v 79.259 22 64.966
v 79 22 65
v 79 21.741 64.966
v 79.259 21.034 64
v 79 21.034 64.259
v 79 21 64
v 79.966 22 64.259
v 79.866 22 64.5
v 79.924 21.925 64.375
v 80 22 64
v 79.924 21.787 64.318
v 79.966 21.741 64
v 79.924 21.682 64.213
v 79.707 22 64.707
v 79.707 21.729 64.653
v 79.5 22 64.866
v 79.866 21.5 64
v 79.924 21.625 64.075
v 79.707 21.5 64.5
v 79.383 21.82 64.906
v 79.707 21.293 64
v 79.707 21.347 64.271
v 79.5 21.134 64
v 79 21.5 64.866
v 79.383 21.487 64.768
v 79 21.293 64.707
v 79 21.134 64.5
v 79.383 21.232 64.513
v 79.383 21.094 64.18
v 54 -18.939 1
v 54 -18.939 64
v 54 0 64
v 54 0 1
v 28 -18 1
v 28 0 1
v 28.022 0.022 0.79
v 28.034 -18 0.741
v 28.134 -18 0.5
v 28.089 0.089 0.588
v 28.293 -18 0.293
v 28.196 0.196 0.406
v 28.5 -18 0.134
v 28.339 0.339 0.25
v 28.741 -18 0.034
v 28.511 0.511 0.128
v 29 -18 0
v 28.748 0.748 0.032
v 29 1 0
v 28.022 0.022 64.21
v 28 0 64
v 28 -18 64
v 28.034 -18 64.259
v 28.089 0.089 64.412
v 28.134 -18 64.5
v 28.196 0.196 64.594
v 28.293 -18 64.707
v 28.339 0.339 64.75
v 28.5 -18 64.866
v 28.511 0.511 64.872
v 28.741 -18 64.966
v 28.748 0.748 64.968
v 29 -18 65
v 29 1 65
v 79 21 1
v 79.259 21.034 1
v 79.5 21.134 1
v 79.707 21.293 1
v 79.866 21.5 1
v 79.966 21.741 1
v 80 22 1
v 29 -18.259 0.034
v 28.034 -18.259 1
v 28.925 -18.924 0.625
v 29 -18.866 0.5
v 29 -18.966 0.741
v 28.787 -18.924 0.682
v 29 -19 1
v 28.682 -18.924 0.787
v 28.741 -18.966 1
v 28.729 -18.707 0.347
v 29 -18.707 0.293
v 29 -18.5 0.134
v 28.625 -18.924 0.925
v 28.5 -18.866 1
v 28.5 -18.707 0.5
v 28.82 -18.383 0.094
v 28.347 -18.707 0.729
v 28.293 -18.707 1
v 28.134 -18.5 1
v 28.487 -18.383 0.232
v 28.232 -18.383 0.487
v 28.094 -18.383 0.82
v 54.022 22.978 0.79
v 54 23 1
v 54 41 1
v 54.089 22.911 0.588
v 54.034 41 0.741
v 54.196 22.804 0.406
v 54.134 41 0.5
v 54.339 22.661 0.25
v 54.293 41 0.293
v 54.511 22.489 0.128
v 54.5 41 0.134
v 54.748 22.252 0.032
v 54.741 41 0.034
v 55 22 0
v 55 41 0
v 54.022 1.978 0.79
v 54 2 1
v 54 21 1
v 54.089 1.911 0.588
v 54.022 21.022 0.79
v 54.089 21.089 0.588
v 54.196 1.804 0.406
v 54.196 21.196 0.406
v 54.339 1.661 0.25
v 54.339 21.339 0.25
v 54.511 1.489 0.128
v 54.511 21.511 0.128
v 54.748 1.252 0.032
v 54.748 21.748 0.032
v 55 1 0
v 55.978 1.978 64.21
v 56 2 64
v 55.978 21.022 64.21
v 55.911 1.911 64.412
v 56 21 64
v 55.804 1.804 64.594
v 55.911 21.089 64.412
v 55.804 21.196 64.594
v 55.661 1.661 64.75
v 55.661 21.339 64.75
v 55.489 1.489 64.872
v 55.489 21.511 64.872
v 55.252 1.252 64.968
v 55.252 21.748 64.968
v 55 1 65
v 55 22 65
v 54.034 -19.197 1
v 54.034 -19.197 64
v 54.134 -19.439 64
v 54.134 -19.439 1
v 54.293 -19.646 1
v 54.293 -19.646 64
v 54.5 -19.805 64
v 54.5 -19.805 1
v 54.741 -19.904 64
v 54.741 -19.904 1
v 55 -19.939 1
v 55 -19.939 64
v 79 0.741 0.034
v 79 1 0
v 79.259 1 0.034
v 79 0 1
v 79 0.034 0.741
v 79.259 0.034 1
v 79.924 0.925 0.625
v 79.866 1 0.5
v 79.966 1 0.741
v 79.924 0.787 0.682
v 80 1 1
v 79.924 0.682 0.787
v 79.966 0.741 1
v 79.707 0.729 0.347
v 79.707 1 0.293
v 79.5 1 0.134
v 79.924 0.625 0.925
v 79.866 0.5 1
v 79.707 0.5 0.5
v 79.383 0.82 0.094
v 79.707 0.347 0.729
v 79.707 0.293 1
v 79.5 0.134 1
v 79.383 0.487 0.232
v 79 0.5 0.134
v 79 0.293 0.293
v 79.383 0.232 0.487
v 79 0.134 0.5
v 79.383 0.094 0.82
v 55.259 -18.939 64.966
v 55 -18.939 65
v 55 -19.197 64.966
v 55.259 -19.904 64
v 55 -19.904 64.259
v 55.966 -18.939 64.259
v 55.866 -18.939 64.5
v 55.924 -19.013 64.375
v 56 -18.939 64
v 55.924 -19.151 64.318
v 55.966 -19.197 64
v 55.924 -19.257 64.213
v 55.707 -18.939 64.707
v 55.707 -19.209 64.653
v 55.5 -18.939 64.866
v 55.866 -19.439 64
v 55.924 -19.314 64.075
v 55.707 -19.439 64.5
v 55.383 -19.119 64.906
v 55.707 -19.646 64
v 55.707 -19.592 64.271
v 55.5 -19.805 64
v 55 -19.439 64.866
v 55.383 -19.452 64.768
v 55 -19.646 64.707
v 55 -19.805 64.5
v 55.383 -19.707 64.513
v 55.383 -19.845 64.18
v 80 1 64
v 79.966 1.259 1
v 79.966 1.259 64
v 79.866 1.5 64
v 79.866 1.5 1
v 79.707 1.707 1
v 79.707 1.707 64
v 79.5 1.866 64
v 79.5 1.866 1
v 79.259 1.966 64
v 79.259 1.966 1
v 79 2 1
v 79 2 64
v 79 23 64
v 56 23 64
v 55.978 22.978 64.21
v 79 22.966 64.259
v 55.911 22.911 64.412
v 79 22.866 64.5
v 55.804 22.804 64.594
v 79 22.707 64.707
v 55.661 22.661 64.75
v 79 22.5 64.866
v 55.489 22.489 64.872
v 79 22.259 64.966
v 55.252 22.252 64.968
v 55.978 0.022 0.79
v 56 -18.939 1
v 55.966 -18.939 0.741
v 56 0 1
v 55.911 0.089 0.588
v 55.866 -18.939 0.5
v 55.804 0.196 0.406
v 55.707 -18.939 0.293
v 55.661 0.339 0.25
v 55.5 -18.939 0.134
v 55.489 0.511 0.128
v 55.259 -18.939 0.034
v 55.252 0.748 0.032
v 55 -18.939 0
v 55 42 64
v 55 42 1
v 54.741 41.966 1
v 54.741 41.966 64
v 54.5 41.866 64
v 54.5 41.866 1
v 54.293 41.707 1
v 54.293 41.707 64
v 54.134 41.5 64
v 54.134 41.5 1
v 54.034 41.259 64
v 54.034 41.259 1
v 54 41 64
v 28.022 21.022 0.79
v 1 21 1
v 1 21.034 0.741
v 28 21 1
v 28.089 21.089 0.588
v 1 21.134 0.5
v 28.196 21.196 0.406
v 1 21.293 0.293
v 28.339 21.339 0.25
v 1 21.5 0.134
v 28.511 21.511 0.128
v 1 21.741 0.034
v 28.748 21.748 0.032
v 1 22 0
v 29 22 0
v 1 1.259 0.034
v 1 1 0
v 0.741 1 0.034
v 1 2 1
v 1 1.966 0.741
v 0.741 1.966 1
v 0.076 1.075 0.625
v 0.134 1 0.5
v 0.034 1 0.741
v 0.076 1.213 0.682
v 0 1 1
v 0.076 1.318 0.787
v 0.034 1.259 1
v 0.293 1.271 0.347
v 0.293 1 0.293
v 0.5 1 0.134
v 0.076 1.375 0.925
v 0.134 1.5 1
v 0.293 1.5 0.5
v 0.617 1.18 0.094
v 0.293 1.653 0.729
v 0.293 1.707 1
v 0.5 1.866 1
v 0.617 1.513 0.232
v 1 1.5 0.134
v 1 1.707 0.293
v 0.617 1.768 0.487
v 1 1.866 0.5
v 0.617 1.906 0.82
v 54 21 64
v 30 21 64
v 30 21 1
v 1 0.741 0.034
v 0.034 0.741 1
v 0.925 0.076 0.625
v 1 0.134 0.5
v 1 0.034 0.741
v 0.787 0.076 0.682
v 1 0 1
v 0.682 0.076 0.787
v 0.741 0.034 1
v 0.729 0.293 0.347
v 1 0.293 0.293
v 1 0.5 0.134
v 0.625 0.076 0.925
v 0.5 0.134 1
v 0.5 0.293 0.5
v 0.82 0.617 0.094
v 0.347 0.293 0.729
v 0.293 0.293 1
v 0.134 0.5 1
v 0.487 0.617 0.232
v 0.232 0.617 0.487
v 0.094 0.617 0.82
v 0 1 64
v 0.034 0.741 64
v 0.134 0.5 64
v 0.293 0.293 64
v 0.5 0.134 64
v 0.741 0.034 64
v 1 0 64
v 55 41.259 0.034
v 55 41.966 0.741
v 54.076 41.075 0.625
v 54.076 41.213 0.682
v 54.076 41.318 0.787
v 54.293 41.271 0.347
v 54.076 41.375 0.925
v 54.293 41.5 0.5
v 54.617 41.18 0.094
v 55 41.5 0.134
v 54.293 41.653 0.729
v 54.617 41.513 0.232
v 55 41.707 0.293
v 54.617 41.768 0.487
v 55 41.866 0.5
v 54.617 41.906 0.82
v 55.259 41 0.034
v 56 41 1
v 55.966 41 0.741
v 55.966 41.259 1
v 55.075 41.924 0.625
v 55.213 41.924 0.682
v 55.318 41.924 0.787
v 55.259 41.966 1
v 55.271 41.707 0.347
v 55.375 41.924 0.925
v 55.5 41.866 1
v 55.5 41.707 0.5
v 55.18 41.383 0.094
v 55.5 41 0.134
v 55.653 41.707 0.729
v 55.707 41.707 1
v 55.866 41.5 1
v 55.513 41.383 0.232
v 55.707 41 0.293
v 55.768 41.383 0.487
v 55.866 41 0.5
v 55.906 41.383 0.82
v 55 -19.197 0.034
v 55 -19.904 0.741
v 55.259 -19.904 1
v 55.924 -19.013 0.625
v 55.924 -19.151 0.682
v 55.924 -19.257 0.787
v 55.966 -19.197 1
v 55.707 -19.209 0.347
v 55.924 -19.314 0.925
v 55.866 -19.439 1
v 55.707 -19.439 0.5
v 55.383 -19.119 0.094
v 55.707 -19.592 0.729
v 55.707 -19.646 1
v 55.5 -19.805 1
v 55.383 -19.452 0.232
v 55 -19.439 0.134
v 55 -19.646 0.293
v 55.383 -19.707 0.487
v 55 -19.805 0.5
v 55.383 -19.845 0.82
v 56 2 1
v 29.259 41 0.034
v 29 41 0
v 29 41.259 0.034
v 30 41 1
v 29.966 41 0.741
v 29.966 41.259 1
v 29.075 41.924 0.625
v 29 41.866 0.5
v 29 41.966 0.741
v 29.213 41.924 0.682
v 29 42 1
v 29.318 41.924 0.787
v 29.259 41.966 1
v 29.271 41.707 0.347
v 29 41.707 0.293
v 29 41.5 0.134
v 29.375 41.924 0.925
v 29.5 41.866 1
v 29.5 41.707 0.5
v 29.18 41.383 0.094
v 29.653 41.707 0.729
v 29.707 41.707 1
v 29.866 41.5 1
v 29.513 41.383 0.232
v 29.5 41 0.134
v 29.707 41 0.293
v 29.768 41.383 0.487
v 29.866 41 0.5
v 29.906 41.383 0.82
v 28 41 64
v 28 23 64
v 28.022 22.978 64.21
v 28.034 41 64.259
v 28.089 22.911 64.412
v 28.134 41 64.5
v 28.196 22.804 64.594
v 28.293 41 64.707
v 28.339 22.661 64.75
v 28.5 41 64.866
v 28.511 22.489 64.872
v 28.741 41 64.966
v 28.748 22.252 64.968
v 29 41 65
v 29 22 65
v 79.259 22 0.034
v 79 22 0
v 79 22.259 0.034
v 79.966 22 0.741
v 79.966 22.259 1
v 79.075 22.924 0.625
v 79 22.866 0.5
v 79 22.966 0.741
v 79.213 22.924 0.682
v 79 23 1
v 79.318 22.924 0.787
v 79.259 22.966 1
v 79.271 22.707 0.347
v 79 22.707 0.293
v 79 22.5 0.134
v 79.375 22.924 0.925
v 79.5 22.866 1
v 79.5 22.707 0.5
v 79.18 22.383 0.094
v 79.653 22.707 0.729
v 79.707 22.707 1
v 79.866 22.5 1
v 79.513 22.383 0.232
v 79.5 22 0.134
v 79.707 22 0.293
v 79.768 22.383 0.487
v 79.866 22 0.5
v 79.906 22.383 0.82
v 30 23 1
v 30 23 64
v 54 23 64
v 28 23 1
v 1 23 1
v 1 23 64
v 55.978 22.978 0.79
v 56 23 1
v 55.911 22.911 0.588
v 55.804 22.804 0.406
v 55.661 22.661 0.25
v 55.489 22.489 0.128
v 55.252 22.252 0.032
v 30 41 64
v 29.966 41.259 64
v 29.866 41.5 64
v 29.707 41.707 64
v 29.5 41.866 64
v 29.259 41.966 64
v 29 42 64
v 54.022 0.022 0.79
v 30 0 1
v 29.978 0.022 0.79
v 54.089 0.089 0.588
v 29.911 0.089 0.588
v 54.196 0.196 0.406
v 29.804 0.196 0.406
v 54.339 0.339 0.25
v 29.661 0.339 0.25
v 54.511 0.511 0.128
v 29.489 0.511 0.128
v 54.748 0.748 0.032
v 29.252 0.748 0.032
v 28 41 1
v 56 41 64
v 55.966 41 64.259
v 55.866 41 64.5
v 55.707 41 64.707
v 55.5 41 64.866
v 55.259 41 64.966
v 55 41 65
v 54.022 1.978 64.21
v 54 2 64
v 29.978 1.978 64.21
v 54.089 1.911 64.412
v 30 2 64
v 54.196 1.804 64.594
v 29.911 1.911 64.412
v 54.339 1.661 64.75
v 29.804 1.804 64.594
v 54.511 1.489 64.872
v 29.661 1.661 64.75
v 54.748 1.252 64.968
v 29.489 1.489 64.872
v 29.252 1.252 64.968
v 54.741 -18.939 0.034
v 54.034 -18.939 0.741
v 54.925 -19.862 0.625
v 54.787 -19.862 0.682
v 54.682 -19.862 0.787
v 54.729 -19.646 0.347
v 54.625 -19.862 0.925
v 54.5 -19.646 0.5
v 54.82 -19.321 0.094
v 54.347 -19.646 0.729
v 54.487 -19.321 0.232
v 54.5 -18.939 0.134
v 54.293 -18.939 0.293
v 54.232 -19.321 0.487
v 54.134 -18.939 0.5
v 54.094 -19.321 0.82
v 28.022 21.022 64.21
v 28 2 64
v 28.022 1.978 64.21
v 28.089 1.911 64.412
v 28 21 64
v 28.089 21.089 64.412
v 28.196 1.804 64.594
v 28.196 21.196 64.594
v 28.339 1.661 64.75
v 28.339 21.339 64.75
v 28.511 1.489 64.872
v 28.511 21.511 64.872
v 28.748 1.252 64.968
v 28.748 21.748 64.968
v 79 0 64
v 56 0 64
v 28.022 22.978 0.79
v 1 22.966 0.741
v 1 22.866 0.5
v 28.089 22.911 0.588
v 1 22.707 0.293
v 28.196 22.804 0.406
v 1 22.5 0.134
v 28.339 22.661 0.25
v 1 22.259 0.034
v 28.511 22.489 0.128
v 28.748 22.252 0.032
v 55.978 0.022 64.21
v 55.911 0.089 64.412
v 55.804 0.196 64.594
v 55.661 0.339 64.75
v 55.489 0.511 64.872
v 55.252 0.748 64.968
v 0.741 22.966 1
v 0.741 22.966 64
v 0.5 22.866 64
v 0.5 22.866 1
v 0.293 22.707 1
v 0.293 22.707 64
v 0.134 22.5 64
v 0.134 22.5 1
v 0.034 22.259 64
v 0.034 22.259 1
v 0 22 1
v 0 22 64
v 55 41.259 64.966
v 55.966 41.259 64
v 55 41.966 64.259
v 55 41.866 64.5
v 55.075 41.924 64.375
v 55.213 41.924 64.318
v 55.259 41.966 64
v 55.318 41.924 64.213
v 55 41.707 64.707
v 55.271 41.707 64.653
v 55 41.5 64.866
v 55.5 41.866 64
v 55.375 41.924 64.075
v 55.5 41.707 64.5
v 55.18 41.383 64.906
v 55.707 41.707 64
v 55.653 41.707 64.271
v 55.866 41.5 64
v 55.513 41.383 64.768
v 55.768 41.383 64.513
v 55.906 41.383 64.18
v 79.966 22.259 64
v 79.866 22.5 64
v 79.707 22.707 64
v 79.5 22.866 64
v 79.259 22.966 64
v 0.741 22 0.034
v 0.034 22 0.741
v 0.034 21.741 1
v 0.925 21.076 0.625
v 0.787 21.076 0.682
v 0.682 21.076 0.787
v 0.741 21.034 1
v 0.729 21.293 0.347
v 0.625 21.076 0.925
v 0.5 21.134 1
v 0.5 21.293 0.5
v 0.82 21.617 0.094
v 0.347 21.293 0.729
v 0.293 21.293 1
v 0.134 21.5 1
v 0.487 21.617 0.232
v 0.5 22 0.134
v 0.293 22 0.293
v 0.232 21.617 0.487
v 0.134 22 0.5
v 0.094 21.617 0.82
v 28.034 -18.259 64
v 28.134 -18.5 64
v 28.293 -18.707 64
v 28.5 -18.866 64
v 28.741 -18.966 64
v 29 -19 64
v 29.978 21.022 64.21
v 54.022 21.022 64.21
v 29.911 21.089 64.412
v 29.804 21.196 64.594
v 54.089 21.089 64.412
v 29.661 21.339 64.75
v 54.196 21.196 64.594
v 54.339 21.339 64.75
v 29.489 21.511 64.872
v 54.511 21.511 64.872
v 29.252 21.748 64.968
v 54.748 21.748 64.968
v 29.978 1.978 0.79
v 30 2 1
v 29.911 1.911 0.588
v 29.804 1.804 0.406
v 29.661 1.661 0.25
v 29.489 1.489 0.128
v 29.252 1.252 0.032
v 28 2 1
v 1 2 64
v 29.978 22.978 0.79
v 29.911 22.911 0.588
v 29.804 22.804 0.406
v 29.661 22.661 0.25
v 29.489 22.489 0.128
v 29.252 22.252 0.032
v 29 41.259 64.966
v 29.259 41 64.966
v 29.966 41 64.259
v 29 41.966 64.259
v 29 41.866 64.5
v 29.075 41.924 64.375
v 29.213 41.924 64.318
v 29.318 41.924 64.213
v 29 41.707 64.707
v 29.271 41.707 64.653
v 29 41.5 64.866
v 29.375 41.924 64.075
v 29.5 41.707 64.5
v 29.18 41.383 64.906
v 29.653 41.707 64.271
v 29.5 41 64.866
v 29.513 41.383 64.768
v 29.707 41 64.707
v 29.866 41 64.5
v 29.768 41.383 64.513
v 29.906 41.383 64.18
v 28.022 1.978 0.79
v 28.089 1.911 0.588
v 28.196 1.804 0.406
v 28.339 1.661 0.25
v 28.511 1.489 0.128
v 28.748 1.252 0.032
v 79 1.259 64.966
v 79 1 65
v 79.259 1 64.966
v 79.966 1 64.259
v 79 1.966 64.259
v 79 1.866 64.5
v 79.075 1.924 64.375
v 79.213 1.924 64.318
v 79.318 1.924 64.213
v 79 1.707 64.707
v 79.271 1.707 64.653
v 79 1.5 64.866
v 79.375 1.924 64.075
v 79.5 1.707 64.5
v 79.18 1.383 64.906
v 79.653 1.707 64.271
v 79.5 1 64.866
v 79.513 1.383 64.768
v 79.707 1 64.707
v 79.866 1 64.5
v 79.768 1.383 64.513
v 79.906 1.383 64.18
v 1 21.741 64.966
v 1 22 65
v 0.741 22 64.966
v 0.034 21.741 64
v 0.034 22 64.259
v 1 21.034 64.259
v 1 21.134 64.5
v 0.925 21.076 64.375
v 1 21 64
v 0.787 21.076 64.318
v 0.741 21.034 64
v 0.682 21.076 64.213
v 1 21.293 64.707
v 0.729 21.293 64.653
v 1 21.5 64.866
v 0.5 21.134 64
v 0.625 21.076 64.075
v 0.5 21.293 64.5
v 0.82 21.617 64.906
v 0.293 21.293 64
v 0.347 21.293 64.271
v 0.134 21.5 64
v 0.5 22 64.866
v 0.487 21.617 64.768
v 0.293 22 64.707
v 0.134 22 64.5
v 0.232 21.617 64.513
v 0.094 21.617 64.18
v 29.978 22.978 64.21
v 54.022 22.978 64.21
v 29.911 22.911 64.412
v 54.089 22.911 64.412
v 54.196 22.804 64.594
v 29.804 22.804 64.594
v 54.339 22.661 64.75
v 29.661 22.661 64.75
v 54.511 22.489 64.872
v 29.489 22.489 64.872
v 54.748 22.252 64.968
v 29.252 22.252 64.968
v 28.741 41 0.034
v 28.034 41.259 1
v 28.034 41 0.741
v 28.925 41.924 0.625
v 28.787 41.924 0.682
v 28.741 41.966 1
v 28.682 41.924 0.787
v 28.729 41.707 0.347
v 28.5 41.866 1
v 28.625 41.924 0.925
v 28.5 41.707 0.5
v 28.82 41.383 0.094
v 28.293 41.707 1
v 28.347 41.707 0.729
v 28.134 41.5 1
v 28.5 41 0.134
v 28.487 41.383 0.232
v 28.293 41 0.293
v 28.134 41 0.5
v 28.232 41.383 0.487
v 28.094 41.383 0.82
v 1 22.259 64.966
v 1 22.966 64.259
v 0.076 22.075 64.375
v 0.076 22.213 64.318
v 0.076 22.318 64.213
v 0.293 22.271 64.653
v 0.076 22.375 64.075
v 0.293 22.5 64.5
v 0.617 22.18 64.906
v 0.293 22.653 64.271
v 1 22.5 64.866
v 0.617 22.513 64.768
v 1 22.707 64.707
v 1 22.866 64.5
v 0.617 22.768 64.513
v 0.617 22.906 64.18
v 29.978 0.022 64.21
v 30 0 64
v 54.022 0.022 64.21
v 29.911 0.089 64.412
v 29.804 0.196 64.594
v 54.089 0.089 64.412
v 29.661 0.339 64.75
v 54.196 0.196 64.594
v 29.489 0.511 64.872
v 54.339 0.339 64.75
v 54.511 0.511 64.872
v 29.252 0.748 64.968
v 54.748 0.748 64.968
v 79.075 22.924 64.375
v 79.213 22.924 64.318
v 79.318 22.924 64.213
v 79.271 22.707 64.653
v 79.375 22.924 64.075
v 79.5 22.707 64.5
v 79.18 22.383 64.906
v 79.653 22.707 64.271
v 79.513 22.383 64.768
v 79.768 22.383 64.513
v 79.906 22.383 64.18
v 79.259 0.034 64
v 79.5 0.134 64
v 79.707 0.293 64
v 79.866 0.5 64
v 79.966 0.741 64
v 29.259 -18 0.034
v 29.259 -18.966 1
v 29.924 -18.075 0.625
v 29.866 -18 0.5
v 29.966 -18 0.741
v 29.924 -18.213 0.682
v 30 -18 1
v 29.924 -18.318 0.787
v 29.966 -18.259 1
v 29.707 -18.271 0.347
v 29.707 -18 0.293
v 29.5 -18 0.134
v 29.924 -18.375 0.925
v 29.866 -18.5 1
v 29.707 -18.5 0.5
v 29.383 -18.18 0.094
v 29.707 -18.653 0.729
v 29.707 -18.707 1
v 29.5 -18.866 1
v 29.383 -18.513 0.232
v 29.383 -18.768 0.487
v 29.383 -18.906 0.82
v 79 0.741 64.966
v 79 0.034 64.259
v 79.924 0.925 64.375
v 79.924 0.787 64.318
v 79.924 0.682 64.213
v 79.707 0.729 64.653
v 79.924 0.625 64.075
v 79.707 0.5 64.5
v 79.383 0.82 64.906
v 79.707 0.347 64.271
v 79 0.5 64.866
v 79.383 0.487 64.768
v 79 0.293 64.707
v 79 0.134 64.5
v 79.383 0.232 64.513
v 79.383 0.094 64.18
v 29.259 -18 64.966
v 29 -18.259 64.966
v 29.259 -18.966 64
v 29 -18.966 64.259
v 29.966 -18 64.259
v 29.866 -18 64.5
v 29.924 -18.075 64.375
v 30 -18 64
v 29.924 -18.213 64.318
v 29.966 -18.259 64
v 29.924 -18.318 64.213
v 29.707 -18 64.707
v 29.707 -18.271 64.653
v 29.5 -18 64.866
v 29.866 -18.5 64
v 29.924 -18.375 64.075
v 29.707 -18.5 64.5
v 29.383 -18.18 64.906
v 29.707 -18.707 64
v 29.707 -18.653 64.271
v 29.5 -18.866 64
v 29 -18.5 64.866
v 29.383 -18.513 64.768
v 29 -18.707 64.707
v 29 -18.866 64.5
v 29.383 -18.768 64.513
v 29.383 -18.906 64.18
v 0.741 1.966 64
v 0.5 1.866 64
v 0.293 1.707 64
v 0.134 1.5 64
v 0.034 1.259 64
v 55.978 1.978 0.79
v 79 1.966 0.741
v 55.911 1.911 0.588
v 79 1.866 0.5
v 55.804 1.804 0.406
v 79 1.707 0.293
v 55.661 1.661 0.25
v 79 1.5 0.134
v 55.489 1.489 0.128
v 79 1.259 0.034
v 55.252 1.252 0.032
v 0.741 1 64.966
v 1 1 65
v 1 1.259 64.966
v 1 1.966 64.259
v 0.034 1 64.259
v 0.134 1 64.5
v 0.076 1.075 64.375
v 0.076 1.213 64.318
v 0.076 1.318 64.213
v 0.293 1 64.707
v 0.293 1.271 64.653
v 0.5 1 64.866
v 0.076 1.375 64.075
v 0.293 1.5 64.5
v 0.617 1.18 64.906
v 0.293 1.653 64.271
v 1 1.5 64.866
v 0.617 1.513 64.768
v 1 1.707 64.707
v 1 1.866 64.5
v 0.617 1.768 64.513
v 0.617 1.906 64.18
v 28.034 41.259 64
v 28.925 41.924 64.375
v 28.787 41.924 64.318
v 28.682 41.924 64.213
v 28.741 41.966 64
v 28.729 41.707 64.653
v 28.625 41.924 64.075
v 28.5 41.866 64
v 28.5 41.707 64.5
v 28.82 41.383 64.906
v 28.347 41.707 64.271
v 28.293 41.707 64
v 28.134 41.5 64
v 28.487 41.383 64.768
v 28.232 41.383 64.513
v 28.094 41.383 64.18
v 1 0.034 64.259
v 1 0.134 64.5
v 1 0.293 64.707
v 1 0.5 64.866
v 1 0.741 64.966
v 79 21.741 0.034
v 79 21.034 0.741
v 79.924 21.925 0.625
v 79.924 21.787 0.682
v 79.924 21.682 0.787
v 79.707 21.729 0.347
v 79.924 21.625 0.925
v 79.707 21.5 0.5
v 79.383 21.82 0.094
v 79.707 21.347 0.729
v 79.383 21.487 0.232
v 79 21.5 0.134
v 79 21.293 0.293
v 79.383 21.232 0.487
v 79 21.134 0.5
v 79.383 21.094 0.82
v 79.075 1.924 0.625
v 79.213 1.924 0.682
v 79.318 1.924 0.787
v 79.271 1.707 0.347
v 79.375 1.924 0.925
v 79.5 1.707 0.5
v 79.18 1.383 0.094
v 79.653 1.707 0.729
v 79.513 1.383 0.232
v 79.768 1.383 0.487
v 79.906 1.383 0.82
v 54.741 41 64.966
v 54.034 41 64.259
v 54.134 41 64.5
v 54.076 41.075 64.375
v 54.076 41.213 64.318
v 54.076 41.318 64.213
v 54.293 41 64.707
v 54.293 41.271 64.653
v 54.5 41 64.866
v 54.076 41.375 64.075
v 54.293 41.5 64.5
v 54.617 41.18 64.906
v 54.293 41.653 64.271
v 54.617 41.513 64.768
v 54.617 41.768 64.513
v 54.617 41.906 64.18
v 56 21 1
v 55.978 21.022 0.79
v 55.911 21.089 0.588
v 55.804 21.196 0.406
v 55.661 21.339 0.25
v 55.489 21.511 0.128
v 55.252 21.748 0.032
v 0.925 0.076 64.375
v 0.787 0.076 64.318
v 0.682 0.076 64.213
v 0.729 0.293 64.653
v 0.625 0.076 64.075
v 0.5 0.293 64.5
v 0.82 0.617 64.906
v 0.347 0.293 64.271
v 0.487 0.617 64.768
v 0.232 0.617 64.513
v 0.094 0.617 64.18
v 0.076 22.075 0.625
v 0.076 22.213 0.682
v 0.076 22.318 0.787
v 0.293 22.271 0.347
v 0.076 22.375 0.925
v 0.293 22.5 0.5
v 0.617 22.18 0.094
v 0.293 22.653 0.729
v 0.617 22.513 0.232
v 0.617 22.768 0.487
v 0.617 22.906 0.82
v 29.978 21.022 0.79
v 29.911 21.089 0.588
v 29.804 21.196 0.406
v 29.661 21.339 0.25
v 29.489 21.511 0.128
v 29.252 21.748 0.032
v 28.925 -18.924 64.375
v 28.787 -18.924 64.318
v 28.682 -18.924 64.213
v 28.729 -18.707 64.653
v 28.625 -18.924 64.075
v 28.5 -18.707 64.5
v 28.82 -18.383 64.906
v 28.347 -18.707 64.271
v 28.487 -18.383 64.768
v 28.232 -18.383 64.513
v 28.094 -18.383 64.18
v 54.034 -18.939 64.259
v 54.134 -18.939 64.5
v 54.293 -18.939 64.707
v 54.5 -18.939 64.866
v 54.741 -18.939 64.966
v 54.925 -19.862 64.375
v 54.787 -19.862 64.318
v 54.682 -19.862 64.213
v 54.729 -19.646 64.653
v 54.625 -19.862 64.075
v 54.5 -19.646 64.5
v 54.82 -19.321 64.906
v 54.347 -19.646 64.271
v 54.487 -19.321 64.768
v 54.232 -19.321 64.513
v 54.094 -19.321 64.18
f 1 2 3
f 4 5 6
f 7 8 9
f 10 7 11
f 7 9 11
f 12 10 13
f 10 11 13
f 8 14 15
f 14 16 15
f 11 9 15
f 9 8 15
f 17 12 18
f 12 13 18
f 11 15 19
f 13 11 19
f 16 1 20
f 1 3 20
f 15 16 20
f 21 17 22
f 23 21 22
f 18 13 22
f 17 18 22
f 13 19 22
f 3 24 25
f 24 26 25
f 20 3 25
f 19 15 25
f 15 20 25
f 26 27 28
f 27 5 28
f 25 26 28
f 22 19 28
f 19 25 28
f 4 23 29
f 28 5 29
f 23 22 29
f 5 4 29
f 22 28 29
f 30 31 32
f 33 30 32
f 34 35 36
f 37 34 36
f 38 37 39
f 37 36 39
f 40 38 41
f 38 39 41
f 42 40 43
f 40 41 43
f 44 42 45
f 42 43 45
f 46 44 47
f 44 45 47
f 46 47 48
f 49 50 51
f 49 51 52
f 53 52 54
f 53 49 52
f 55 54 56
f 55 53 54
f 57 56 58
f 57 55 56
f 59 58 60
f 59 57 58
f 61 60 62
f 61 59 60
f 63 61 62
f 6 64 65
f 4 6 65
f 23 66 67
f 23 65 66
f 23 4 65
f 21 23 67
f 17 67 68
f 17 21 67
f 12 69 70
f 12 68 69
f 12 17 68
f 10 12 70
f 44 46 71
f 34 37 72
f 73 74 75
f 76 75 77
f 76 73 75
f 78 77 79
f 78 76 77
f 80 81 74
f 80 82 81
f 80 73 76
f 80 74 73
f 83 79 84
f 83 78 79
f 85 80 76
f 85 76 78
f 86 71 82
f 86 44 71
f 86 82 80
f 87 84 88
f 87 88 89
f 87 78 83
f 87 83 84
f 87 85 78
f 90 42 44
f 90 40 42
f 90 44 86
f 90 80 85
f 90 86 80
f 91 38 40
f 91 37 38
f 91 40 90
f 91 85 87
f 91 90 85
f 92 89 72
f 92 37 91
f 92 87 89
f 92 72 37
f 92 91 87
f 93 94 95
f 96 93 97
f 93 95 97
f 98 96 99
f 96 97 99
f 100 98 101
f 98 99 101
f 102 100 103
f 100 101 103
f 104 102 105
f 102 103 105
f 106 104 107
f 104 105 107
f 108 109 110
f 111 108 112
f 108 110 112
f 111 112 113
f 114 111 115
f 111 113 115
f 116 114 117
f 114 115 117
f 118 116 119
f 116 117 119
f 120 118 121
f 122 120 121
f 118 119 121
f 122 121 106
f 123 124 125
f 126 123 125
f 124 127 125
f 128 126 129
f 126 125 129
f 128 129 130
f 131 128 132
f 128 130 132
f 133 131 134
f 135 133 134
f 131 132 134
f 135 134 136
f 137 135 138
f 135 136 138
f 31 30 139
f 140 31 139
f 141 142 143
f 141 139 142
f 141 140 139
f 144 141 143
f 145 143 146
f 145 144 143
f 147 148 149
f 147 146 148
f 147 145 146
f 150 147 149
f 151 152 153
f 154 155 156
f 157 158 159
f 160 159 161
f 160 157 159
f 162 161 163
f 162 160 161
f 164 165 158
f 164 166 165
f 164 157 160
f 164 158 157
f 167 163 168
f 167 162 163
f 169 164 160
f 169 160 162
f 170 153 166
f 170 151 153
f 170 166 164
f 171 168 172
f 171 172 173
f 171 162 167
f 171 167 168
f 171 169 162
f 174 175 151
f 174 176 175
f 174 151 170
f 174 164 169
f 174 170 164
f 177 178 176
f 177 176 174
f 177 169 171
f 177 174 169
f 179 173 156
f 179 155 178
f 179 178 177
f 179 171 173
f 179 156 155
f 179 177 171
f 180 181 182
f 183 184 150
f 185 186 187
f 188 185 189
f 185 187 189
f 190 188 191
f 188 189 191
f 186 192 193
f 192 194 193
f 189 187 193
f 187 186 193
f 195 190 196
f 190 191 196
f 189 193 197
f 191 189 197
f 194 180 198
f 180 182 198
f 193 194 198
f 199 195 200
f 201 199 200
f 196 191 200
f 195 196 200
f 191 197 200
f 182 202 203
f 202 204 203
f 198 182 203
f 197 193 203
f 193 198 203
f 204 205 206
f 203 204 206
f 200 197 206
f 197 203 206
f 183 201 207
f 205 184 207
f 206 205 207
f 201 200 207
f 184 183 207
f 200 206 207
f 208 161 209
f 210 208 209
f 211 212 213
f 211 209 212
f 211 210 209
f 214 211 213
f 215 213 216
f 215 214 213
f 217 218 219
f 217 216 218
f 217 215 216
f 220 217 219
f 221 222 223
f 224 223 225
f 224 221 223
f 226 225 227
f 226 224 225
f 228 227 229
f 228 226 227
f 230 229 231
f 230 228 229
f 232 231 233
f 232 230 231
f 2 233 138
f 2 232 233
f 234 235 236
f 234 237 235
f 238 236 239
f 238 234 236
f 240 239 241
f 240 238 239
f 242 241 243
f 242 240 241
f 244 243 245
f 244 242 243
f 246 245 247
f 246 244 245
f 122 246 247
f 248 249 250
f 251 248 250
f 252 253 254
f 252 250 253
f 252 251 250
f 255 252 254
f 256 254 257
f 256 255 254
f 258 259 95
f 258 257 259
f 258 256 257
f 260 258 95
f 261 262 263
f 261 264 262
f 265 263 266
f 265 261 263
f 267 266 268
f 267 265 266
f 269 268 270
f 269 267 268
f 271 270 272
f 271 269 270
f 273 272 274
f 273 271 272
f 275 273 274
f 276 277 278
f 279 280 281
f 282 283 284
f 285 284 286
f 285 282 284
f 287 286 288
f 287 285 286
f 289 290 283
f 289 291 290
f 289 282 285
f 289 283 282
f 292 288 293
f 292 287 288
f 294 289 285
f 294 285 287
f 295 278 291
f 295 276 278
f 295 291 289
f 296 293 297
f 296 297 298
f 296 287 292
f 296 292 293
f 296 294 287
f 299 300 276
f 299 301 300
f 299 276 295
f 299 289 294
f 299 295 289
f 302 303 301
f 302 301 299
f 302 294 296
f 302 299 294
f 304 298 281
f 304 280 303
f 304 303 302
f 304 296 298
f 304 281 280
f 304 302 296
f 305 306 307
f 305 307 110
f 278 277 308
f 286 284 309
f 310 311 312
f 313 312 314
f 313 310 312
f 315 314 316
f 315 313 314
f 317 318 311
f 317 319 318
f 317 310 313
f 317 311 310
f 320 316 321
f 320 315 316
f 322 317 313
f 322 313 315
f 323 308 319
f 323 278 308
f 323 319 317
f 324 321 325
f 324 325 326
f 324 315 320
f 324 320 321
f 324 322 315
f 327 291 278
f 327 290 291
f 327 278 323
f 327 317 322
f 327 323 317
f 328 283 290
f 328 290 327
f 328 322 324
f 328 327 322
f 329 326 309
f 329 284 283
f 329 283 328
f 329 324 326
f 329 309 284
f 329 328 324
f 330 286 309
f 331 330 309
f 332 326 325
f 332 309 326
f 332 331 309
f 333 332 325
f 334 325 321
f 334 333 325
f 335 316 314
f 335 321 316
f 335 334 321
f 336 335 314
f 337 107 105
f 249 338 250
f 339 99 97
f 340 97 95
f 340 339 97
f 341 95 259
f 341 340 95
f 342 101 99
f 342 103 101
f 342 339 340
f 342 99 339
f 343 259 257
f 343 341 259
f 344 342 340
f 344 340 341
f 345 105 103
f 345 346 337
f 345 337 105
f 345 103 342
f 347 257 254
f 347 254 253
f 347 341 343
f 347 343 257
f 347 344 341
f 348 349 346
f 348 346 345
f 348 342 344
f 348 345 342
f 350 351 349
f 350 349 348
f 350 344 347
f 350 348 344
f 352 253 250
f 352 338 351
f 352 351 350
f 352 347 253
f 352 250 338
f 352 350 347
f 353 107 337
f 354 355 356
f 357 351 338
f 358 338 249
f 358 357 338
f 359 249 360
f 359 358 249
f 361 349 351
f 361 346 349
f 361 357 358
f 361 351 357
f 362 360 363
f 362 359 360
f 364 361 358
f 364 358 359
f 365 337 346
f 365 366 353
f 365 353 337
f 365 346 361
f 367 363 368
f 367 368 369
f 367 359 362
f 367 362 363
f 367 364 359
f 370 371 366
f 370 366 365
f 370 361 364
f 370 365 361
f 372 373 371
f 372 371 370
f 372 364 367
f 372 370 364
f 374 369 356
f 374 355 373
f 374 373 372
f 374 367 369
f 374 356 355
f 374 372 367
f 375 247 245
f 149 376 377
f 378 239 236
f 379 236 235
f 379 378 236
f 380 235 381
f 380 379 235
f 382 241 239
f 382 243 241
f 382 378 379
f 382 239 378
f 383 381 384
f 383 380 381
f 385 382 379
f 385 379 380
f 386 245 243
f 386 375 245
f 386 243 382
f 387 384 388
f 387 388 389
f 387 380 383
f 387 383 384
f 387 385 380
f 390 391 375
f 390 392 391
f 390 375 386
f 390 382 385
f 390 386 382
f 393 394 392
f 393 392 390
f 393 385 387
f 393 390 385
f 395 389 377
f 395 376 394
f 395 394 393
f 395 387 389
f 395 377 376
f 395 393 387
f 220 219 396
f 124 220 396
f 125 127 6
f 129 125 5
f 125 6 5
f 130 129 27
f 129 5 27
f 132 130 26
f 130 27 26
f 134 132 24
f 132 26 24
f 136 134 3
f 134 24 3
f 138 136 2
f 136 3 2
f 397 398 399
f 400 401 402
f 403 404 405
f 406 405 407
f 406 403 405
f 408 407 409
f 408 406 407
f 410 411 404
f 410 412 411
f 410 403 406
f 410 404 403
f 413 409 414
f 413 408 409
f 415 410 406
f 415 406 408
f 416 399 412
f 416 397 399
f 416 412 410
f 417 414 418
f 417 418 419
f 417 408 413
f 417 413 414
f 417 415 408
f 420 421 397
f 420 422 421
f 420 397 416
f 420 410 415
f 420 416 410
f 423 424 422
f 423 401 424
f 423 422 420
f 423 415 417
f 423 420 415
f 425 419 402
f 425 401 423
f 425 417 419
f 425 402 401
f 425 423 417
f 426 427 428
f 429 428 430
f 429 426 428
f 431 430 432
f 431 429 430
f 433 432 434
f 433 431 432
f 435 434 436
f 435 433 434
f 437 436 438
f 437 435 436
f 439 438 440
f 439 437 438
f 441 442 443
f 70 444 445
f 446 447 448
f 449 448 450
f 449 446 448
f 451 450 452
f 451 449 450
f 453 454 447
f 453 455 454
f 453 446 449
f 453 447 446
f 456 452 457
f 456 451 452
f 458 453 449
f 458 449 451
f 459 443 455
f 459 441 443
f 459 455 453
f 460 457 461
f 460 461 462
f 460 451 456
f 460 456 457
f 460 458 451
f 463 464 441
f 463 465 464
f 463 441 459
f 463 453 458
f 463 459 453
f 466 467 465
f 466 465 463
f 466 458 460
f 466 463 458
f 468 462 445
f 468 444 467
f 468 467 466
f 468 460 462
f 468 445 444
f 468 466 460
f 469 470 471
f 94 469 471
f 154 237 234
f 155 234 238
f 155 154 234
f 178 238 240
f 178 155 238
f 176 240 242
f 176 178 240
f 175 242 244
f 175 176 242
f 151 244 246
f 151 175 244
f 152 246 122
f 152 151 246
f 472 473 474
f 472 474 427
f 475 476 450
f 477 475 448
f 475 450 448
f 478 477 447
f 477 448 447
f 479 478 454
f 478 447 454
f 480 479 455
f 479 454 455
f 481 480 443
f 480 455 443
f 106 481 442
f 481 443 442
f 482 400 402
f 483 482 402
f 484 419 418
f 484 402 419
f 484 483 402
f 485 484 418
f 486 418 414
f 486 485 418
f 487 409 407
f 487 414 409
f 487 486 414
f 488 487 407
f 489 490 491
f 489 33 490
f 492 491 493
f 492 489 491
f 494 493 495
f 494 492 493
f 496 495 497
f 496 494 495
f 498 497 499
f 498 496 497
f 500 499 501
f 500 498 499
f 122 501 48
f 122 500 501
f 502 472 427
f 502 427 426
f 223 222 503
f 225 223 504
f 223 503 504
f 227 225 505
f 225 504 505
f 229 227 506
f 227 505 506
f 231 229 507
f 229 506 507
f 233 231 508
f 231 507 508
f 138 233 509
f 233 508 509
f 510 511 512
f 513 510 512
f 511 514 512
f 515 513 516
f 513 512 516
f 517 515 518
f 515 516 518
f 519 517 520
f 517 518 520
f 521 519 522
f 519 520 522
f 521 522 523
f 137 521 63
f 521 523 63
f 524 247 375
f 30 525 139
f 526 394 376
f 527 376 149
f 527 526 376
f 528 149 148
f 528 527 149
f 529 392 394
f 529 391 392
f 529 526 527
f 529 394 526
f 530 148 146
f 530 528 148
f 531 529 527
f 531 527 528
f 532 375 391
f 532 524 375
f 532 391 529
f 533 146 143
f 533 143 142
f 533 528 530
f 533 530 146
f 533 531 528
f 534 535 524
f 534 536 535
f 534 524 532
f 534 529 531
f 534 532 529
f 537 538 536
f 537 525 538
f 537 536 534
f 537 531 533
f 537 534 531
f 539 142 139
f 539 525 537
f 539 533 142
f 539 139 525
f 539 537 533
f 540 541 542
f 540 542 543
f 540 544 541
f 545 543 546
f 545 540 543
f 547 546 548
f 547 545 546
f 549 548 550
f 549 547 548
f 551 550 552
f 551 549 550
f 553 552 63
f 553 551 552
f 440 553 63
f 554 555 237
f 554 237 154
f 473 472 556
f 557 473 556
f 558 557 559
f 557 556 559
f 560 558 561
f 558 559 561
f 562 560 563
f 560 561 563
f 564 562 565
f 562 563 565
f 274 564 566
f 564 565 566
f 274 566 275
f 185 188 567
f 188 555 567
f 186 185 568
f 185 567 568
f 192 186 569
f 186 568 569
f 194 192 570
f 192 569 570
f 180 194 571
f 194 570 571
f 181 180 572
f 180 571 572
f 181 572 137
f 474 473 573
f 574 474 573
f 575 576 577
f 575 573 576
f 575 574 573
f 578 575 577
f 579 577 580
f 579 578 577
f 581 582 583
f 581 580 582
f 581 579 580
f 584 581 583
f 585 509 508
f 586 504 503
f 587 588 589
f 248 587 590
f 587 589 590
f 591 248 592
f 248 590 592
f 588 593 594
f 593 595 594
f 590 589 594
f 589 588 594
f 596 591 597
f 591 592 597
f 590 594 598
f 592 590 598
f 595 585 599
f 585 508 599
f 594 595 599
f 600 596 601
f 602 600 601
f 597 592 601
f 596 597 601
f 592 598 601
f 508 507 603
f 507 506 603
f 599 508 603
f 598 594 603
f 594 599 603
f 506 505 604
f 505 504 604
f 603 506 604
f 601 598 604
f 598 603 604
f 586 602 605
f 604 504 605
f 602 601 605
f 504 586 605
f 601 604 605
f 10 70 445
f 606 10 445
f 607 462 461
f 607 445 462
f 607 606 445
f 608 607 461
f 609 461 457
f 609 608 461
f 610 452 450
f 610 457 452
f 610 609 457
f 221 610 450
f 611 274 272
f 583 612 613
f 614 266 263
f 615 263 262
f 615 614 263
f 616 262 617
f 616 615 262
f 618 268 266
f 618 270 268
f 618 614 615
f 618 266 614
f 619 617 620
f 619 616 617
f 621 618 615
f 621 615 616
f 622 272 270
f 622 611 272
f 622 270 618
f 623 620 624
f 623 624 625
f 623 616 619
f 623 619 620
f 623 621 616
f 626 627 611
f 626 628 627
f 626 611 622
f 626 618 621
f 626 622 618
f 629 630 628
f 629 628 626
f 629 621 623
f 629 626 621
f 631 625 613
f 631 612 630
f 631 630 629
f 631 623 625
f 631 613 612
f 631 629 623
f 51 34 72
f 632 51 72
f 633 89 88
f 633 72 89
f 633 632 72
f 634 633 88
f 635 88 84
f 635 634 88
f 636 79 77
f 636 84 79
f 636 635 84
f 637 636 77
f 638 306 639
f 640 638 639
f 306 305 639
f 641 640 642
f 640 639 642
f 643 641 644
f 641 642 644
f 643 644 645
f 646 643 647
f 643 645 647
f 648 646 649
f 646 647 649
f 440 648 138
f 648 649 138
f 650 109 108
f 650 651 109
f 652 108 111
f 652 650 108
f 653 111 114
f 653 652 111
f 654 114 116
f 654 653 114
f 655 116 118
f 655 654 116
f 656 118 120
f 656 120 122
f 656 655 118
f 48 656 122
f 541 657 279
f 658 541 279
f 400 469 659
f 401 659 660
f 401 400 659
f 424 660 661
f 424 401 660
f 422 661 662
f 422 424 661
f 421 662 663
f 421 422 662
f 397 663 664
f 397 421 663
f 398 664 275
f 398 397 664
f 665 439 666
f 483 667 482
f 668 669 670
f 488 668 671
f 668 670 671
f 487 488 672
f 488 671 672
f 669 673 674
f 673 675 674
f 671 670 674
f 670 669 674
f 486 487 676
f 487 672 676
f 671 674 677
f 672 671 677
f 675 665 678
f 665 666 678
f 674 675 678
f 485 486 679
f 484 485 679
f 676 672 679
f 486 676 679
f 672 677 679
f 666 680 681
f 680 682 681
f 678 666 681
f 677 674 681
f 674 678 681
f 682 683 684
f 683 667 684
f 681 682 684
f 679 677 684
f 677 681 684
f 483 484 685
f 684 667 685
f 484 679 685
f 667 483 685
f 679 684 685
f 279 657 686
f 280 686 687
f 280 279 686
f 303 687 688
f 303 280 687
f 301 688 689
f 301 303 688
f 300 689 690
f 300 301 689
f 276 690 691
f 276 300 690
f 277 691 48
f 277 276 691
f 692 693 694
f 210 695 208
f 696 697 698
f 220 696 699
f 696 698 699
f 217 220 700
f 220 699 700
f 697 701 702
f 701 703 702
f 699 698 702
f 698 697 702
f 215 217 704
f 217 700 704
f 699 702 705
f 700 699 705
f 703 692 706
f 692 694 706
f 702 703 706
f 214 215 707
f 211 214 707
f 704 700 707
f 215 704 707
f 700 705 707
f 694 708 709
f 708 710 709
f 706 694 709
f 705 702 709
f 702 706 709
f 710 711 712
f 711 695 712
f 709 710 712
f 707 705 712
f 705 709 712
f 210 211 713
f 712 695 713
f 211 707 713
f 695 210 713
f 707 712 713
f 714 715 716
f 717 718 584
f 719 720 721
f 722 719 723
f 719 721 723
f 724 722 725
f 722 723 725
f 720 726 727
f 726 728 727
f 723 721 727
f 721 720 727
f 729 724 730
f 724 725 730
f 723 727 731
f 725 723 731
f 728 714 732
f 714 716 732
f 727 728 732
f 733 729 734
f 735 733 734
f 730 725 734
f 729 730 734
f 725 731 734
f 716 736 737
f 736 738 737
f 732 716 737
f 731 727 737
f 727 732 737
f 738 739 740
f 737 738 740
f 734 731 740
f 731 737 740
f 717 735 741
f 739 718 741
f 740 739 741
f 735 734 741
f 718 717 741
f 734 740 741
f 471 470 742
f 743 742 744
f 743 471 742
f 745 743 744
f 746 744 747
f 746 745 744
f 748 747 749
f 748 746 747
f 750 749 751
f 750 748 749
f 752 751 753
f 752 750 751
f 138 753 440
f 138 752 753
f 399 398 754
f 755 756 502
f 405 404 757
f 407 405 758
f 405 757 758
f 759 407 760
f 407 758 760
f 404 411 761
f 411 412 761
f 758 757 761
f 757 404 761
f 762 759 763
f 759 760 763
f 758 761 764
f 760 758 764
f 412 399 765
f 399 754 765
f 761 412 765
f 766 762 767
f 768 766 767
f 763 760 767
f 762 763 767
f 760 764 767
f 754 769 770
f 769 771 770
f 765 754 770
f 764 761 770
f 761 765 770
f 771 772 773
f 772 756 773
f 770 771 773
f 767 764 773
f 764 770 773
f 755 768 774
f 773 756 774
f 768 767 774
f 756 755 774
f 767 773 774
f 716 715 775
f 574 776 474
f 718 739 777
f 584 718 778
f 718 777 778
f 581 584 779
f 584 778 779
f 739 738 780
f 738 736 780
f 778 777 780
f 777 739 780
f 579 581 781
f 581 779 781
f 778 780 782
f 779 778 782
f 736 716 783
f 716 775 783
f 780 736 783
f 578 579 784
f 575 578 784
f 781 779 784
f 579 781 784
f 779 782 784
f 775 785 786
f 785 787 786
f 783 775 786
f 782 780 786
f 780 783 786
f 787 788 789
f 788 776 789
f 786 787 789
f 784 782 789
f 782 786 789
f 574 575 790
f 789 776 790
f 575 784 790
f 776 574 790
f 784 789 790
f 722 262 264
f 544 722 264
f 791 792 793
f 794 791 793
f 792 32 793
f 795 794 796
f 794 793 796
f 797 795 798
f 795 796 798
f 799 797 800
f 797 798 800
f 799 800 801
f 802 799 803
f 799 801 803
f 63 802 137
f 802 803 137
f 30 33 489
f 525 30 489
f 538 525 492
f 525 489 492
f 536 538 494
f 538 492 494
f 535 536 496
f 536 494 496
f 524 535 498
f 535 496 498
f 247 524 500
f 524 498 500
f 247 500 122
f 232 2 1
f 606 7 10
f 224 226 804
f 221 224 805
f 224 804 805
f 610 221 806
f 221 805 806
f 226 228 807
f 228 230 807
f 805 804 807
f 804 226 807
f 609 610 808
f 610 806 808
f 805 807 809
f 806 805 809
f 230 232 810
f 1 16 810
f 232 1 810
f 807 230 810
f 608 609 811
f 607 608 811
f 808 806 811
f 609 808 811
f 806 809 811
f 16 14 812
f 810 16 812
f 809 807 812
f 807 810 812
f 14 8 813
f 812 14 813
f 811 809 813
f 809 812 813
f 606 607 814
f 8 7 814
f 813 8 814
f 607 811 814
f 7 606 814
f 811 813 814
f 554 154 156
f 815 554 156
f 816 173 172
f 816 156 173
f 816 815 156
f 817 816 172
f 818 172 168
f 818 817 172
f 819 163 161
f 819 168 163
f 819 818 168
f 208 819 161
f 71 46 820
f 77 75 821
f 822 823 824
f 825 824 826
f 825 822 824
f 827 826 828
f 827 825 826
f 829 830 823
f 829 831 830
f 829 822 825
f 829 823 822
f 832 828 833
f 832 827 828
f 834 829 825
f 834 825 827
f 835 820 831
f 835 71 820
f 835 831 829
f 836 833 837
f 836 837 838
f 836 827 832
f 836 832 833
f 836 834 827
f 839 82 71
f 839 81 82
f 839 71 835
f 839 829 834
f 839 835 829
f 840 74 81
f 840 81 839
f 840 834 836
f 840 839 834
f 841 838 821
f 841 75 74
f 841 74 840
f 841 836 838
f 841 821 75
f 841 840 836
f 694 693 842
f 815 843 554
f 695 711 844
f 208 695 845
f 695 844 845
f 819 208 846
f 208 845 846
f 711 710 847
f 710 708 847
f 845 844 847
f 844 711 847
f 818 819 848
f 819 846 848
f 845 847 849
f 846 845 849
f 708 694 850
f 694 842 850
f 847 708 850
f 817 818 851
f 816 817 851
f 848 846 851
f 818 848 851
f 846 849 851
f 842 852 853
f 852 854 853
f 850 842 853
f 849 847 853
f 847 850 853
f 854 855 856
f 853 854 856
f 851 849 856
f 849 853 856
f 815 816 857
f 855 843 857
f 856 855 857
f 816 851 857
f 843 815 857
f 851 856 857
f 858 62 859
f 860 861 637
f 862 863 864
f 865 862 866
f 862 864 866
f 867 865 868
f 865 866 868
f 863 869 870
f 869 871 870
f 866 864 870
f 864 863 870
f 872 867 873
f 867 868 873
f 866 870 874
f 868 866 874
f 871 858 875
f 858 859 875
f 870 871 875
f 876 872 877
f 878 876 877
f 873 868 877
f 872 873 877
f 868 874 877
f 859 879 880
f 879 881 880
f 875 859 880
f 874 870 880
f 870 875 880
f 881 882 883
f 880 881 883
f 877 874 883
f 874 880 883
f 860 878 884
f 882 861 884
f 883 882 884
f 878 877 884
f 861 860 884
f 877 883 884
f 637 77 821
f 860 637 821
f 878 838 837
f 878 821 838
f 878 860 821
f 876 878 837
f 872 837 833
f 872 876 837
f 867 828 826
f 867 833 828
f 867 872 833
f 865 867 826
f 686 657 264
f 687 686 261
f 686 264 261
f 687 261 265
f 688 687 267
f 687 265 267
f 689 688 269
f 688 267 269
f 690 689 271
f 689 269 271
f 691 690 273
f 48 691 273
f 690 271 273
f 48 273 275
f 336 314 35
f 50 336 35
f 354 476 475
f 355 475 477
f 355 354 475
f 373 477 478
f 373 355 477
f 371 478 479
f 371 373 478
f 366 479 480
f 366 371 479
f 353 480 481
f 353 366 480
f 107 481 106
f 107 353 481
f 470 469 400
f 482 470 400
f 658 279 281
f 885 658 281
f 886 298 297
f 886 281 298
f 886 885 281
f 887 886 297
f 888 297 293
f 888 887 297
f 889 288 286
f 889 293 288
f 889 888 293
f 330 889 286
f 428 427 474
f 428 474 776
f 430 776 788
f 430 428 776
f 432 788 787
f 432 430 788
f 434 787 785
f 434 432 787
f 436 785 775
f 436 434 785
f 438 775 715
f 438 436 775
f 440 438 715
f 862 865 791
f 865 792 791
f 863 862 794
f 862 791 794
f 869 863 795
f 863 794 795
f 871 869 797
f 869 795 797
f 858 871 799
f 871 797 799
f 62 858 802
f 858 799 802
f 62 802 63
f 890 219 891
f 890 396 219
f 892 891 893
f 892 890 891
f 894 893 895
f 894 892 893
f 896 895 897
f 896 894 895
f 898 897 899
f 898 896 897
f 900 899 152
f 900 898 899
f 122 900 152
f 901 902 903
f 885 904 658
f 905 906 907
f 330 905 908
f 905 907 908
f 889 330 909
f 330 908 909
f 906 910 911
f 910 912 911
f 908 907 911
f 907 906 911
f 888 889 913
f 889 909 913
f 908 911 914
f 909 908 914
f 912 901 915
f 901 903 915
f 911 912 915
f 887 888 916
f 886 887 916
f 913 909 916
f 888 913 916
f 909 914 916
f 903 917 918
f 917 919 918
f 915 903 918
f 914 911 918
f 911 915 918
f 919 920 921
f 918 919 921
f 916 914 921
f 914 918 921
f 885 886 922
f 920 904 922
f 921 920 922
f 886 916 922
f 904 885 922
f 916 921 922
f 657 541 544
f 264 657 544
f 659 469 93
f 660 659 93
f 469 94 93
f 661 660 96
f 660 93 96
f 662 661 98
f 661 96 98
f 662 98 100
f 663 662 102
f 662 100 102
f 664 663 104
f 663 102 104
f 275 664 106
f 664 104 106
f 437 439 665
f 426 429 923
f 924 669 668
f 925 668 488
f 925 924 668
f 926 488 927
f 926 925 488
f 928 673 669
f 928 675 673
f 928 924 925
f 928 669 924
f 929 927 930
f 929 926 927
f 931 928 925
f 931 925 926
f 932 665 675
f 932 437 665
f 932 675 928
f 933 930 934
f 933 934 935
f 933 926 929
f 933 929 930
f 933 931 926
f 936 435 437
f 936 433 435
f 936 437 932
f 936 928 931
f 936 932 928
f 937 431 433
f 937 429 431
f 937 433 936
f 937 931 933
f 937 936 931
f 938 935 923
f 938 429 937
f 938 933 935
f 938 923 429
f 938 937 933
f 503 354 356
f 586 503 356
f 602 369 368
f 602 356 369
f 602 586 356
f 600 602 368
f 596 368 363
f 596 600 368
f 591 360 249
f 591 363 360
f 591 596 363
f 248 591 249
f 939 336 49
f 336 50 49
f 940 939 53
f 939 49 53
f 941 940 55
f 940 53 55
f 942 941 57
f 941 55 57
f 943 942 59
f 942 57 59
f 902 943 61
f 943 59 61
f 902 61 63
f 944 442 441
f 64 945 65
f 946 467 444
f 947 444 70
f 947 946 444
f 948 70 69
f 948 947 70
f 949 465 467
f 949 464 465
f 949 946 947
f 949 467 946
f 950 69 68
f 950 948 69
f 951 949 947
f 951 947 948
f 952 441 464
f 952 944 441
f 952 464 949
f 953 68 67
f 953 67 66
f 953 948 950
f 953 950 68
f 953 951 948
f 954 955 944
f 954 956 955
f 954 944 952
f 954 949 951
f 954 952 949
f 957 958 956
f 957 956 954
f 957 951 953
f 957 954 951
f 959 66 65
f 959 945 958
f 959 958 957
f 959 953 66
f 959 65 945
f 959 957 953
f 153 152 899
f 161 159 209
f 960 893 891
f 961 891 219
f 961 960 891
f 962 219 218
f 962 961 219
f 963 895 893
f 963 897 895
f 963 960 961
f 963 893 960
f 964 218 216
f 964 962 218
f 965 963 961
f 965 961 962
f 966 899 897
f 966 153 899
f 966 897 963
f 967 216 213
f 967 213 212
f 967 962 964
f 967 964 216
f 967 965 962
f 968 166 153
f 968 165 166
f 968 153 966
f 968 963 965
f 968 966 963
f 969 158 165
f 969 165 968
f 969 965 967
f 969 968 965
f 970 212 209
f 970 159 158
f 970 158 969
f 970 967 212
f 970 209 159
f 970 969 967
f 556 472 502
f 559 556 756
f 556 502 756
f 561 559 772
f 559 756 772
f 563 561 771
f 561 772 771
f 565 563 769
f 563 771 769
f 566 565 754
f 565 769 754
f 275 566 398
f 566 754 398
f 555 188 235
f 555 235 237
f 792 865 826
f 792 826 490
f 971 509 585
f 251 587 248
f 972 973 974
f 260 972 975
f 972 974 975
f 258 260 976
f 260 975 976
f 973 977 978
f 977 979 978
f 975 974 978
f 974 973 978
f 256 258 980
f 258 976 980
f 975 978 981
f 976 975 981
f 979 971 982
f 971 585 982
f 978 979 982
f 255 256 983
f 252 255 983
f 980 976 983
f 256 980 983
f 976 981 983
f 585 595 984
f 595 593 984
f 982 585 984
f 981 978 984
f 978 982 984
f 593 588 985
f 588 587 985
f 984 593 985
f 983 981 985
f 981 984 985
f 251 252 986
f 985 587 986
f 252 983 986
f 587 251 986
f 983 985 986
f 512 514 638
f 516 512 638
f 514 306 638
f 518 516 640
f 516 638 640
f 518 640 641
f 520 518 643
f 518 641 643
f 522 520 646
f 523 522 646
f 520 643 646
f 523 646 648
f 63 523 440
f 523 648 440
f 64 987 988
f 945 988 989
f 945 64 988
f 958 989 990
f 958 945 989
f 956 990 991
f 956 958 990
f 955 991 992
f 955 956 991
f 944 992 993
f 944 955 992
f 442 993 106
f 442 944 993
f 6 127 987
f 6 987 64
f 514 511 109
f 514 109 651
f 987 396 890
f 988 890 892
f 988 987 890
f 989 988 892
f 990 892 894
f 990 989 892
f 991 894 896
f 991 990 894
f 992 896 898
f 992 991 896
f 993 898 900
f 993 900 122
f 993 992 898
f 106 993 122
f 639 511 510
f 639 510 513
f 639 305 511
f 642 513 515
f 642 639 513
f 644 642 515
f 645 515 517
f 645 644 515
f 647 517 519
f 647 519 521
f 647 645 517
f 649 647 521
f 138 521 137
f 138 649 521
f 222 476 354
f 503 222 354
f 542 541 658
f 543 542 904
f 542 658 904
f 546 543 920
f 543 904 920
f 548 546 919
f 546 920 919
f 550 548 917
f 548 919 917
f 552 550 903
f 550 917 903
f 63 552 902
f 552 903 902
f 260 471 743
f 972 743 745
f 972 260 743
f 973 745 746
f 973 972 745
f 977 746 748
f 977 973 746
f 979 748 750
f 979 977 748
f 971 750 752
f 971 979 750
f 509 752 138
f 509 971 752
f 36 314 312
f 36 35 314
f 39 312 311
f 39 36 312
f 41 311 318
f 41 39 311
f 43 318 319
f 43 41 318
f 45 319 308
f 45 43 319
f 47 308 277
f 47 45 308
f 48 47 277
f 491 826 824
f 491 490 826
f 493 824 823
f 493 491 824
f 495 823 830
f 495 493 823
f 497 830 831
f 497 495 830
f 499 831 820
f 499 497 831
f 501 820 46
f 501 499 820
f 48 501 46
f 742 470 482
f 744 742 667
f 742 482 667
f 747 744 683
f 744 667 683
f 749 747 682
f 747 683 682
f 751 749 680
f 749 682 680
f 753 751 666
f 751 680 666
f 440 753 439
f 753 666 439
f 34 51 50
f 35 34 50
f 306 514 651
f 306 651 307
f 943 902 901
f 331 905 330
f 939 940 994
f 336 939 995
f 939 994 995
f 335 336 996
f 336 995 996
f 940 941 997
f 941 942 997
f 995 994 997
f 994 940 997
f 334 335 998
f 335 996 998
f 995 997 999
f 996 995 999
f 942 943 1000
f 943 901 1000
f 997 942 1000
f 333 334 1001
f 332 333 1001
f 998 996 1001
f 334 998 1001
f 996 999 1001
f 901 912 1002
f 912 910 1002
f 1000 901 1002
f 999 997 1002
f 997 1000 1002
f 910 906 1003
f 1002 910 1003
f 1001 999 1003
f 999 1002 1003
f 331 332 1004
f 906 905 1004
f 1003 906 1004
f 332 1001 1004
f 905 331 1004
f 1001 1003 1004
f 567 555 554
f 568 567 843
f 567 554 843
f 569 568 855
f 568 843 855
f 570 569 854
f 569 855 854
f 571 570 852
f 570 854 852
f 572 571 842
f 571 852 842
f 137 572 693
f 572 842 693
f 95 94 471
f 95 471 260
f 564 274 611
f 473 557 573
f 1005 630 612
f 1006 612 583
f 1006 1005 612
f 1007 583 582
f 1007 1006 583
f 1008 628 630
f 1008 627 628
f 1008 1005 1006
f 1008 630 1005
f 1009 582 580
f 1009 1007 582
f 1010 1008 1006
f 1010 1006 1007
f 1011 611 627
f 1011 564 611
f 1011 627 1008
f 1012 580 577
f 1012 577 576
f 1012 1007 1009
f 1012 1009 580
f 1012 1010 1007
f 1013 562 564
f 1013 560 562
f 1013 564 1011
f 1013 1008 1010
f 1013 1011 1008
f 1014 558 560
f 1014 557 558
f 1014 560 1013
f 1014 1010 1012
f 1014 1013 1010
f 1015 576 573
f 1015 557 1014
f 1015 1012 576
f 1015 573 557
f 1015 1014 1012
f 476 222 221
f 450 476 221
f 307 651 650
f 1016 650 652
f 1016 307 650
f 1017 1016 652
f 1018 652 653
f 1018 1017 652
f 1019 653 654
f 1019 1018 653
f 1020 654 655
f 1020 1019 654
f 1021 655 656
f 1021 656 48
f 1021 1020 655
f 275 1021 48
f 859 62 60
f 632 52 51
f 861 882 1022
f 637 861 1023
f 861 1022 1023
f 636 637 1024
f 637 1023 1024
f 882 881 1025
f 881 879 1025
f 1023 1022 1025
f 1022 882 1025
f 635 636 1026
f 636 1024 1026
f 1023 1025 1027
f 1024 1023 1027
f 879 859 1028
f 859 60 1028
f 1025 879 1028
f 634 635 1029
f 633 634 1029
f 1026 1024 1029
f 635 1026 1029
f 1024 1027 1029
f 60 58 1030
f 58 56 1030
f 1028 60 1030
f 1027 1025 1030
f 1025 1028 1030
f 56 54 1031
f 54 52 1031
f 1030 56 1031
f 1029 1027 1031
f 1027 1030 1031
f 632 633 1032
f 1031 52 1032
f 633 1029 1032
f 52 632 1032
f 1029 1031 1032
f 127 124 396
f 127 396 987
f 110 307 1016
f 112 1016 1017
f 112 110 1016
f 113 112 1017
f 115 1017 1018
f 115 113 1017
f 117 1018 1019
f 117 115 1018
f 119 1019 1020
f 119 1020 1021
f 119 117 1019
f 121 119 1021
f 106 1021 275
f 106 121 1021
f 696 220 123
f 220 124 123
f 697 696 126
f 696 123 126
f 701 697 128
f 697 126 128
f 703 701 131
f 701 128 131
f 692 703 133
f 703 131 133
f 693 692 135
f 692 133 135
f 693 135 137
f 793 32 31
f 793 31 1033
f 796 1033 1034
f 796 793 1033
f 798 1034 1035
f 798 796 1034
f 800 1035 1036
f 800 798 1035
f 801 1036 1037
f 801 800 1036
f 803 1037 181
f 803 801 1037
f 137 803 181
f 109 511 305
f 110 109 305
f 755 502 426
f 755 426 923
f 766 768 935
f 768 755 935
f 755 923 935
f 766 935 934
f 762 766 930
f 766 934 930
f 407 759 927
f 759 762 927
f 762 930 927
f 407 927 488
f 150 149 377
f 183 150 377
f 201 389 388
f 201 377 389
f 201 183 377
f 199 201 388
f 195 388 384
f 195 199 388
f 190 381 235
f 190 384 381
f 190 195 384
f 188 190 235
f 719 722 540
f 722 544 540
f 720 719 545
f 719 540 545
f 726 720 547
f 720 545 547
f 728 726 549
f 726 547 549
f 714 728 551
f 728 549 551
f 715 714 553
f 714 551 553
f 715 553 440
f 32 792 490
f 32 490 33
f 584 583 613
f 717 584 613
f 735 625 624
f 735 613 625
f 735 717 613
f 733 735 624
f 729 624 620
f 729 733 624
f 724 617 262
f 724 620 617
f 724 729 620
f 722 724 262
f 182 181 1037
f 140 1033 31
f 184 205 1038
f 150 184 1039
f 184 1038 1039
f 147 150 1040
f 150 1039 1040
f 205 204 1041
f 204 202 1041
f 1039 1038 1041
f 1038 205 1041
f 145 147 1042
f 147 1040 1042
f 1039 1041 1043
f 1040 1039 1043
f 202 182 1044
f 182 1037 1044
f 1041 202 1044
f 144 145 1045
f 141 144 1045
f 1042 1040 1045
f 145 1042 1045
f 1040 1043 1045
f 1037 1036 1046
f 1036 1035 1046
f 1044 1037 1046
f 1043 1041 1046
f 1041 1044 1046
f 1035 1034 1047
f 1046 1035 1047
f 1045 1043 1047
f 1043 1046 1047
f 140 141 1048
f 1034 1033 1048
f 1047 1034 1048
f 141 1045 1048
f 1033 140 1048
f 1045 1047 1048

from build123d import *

# Parameters (mm, degrees)
F0_W     = 2
F0_H     = 19
F0_W_2   = 28
F0_H_2   = 2
F0_W_3   = 24
F0_H_3   = 19.9385005981
F1_DEPTH = 65
F2_R     = 0.99999


# Not quite as in the source:
# - a fillet or chamfer is up to 0.001 mm smaller than in the source, because OpenCascade refuses the exact size


with BuildPart() as f1:
    # F0 (on Top) → F1 (new body)
    with BuildSketch(Plane.XY):
        with Locations((29, 32.5)):
            Rectangle(F0_W, F0_H)
        with Locations((14, 22)):
            Rectangle(F0_W_2, F0_H_2)
        with Locations((42, 22)):
            Rectangle(F0_W_3, F0_H_2)
        with Locations((55, 32.5)):
            Rectangle(F0_W, F0_H)
        with Locations((55, 22)):
            Rectangle(F0_W, F0_H_2)
        with Locations((68, 22)):
            Rectangle(F0_W_3, F0_H_2)
        with Locations((68, 1)):
            Rectangle(F0_W_3, F0_H_2)
        with Locations((55, 1)):
            Rectangle(F0_W, F0_H_2)
        with Locations((42, 1)):
            Rectangle(F0_W_3, F0_H_2)
        with Locations((14, 1)):
            Rectangle(F0_W_2, F0_H_2)
        with Locations((29, 1)):
            Rectangle(F0_W, F0_H_2)
        with Locations((29, 11.5)):
            Rectangle(F0_W, F0_H)
        with Locations((29, -9.5)):
            Rectangle(F0_W, F0_H)
        with Locations((55, -9.969250299)):
            Rectangle(F0_W, F0_H_3)
        with Locations((29, 22)):
            Rectangle(F0_W, F0_H_2)
        with Locations((55, 11.5)):
            Rectangle(F0_W, F0_H)
    extrude(amount=F1_DEPTH)

    # F2 (radius 1 in the source; OpenCascade refuses exactly that, so slightly less here)
    f2_edges = [f1.edges().sort_by_distance(p)[0] for p in [
        (28, 32.5, 65),
        (14, 23, 65),
        (0, 22, 65),
        (14, 21, 65),
        (28, 11.5, 65),
        (14, 2, 65),
        (0, 1, 65),
        (14, 0, 65),
        (28, -9.5, 65),
        (29, -19, 65),
        (30, -9.5, 65),
        (42, 0, 65),
        (54, -9.96925, 65),
        (55, -19.938501, 65),
        (56, -9.96925, 65),
        (68, 0, 65),
        (80, 1, 65),
        (68, 2, 65),
        (56, 11.5, 65),
        (68, 21, 65),
        (80, 22, 65),
        (68, 23, 65),
        (56, 32.5, 65),
        (55, 42, 65),
        (54, 32.5, 65),
        (42, 23, 65),
        (30, 32.5, 65),
        (29, 42, 65),
        (42, 2, 65),
        (30, 11.5, 65),
        (42, 21, 65),
        (54, 11.5, 65),
        (28, 32.5, 0),
        (14, 23, 0),
        (0, 22, 0),
        (14, 21, 0),
        (28, 11.5, 0),
        (14, 2, 0),
        (0, 1, 0),
        (14, 0, 0),
        (28, -9.5, 0),
        (29, -19, 0),
        (30, -9.5, 0),
        (42, 0, 0),
        (54, -9.96925, 0),
        (55, -19.938501, 0),
        (56, -9.96925, 0),
        (68, 0, 0),
        (80, 1, 0),
        (68, 2, 0),
        (56, 11.5, 0),
        (68, 21, 0),
        (80, 22, 0),
        (68, 23, 0),
        (56, 32.5, 0),
        (55, 42, 0),
        (54, 32.5, 0),
        (42, 23, 0),
        (30, 32.5, 0),
        (29, 42, 0),
        (42, 2, 0),
        (30, 11.5, 0),
        (42, 21, 0),
        (54, 11.5, 0),
        (30, 42, 32.5),
        (28, 42, 32.5),
        (56, 42, 32.5),
        (54, 42, 32.5),
        (0, 23, 32.5),
        (0, 21, 32.5),
        (0, 2, 32.5),
        (0, 0, 32.5),
        (28, -19, 32.5),
        (30, -19, 32.5),
        (54, -19.938501, 32.5),
        (56, -19.938501, 32.5),
        (80, 0, 32.5),
        (80, 2, 32.5),
        (80, 21, 32.5),
        (80, 23, 32.5),
    ]]
    fillet(f2_edges, radius=F2_R)


solid = f1.part
